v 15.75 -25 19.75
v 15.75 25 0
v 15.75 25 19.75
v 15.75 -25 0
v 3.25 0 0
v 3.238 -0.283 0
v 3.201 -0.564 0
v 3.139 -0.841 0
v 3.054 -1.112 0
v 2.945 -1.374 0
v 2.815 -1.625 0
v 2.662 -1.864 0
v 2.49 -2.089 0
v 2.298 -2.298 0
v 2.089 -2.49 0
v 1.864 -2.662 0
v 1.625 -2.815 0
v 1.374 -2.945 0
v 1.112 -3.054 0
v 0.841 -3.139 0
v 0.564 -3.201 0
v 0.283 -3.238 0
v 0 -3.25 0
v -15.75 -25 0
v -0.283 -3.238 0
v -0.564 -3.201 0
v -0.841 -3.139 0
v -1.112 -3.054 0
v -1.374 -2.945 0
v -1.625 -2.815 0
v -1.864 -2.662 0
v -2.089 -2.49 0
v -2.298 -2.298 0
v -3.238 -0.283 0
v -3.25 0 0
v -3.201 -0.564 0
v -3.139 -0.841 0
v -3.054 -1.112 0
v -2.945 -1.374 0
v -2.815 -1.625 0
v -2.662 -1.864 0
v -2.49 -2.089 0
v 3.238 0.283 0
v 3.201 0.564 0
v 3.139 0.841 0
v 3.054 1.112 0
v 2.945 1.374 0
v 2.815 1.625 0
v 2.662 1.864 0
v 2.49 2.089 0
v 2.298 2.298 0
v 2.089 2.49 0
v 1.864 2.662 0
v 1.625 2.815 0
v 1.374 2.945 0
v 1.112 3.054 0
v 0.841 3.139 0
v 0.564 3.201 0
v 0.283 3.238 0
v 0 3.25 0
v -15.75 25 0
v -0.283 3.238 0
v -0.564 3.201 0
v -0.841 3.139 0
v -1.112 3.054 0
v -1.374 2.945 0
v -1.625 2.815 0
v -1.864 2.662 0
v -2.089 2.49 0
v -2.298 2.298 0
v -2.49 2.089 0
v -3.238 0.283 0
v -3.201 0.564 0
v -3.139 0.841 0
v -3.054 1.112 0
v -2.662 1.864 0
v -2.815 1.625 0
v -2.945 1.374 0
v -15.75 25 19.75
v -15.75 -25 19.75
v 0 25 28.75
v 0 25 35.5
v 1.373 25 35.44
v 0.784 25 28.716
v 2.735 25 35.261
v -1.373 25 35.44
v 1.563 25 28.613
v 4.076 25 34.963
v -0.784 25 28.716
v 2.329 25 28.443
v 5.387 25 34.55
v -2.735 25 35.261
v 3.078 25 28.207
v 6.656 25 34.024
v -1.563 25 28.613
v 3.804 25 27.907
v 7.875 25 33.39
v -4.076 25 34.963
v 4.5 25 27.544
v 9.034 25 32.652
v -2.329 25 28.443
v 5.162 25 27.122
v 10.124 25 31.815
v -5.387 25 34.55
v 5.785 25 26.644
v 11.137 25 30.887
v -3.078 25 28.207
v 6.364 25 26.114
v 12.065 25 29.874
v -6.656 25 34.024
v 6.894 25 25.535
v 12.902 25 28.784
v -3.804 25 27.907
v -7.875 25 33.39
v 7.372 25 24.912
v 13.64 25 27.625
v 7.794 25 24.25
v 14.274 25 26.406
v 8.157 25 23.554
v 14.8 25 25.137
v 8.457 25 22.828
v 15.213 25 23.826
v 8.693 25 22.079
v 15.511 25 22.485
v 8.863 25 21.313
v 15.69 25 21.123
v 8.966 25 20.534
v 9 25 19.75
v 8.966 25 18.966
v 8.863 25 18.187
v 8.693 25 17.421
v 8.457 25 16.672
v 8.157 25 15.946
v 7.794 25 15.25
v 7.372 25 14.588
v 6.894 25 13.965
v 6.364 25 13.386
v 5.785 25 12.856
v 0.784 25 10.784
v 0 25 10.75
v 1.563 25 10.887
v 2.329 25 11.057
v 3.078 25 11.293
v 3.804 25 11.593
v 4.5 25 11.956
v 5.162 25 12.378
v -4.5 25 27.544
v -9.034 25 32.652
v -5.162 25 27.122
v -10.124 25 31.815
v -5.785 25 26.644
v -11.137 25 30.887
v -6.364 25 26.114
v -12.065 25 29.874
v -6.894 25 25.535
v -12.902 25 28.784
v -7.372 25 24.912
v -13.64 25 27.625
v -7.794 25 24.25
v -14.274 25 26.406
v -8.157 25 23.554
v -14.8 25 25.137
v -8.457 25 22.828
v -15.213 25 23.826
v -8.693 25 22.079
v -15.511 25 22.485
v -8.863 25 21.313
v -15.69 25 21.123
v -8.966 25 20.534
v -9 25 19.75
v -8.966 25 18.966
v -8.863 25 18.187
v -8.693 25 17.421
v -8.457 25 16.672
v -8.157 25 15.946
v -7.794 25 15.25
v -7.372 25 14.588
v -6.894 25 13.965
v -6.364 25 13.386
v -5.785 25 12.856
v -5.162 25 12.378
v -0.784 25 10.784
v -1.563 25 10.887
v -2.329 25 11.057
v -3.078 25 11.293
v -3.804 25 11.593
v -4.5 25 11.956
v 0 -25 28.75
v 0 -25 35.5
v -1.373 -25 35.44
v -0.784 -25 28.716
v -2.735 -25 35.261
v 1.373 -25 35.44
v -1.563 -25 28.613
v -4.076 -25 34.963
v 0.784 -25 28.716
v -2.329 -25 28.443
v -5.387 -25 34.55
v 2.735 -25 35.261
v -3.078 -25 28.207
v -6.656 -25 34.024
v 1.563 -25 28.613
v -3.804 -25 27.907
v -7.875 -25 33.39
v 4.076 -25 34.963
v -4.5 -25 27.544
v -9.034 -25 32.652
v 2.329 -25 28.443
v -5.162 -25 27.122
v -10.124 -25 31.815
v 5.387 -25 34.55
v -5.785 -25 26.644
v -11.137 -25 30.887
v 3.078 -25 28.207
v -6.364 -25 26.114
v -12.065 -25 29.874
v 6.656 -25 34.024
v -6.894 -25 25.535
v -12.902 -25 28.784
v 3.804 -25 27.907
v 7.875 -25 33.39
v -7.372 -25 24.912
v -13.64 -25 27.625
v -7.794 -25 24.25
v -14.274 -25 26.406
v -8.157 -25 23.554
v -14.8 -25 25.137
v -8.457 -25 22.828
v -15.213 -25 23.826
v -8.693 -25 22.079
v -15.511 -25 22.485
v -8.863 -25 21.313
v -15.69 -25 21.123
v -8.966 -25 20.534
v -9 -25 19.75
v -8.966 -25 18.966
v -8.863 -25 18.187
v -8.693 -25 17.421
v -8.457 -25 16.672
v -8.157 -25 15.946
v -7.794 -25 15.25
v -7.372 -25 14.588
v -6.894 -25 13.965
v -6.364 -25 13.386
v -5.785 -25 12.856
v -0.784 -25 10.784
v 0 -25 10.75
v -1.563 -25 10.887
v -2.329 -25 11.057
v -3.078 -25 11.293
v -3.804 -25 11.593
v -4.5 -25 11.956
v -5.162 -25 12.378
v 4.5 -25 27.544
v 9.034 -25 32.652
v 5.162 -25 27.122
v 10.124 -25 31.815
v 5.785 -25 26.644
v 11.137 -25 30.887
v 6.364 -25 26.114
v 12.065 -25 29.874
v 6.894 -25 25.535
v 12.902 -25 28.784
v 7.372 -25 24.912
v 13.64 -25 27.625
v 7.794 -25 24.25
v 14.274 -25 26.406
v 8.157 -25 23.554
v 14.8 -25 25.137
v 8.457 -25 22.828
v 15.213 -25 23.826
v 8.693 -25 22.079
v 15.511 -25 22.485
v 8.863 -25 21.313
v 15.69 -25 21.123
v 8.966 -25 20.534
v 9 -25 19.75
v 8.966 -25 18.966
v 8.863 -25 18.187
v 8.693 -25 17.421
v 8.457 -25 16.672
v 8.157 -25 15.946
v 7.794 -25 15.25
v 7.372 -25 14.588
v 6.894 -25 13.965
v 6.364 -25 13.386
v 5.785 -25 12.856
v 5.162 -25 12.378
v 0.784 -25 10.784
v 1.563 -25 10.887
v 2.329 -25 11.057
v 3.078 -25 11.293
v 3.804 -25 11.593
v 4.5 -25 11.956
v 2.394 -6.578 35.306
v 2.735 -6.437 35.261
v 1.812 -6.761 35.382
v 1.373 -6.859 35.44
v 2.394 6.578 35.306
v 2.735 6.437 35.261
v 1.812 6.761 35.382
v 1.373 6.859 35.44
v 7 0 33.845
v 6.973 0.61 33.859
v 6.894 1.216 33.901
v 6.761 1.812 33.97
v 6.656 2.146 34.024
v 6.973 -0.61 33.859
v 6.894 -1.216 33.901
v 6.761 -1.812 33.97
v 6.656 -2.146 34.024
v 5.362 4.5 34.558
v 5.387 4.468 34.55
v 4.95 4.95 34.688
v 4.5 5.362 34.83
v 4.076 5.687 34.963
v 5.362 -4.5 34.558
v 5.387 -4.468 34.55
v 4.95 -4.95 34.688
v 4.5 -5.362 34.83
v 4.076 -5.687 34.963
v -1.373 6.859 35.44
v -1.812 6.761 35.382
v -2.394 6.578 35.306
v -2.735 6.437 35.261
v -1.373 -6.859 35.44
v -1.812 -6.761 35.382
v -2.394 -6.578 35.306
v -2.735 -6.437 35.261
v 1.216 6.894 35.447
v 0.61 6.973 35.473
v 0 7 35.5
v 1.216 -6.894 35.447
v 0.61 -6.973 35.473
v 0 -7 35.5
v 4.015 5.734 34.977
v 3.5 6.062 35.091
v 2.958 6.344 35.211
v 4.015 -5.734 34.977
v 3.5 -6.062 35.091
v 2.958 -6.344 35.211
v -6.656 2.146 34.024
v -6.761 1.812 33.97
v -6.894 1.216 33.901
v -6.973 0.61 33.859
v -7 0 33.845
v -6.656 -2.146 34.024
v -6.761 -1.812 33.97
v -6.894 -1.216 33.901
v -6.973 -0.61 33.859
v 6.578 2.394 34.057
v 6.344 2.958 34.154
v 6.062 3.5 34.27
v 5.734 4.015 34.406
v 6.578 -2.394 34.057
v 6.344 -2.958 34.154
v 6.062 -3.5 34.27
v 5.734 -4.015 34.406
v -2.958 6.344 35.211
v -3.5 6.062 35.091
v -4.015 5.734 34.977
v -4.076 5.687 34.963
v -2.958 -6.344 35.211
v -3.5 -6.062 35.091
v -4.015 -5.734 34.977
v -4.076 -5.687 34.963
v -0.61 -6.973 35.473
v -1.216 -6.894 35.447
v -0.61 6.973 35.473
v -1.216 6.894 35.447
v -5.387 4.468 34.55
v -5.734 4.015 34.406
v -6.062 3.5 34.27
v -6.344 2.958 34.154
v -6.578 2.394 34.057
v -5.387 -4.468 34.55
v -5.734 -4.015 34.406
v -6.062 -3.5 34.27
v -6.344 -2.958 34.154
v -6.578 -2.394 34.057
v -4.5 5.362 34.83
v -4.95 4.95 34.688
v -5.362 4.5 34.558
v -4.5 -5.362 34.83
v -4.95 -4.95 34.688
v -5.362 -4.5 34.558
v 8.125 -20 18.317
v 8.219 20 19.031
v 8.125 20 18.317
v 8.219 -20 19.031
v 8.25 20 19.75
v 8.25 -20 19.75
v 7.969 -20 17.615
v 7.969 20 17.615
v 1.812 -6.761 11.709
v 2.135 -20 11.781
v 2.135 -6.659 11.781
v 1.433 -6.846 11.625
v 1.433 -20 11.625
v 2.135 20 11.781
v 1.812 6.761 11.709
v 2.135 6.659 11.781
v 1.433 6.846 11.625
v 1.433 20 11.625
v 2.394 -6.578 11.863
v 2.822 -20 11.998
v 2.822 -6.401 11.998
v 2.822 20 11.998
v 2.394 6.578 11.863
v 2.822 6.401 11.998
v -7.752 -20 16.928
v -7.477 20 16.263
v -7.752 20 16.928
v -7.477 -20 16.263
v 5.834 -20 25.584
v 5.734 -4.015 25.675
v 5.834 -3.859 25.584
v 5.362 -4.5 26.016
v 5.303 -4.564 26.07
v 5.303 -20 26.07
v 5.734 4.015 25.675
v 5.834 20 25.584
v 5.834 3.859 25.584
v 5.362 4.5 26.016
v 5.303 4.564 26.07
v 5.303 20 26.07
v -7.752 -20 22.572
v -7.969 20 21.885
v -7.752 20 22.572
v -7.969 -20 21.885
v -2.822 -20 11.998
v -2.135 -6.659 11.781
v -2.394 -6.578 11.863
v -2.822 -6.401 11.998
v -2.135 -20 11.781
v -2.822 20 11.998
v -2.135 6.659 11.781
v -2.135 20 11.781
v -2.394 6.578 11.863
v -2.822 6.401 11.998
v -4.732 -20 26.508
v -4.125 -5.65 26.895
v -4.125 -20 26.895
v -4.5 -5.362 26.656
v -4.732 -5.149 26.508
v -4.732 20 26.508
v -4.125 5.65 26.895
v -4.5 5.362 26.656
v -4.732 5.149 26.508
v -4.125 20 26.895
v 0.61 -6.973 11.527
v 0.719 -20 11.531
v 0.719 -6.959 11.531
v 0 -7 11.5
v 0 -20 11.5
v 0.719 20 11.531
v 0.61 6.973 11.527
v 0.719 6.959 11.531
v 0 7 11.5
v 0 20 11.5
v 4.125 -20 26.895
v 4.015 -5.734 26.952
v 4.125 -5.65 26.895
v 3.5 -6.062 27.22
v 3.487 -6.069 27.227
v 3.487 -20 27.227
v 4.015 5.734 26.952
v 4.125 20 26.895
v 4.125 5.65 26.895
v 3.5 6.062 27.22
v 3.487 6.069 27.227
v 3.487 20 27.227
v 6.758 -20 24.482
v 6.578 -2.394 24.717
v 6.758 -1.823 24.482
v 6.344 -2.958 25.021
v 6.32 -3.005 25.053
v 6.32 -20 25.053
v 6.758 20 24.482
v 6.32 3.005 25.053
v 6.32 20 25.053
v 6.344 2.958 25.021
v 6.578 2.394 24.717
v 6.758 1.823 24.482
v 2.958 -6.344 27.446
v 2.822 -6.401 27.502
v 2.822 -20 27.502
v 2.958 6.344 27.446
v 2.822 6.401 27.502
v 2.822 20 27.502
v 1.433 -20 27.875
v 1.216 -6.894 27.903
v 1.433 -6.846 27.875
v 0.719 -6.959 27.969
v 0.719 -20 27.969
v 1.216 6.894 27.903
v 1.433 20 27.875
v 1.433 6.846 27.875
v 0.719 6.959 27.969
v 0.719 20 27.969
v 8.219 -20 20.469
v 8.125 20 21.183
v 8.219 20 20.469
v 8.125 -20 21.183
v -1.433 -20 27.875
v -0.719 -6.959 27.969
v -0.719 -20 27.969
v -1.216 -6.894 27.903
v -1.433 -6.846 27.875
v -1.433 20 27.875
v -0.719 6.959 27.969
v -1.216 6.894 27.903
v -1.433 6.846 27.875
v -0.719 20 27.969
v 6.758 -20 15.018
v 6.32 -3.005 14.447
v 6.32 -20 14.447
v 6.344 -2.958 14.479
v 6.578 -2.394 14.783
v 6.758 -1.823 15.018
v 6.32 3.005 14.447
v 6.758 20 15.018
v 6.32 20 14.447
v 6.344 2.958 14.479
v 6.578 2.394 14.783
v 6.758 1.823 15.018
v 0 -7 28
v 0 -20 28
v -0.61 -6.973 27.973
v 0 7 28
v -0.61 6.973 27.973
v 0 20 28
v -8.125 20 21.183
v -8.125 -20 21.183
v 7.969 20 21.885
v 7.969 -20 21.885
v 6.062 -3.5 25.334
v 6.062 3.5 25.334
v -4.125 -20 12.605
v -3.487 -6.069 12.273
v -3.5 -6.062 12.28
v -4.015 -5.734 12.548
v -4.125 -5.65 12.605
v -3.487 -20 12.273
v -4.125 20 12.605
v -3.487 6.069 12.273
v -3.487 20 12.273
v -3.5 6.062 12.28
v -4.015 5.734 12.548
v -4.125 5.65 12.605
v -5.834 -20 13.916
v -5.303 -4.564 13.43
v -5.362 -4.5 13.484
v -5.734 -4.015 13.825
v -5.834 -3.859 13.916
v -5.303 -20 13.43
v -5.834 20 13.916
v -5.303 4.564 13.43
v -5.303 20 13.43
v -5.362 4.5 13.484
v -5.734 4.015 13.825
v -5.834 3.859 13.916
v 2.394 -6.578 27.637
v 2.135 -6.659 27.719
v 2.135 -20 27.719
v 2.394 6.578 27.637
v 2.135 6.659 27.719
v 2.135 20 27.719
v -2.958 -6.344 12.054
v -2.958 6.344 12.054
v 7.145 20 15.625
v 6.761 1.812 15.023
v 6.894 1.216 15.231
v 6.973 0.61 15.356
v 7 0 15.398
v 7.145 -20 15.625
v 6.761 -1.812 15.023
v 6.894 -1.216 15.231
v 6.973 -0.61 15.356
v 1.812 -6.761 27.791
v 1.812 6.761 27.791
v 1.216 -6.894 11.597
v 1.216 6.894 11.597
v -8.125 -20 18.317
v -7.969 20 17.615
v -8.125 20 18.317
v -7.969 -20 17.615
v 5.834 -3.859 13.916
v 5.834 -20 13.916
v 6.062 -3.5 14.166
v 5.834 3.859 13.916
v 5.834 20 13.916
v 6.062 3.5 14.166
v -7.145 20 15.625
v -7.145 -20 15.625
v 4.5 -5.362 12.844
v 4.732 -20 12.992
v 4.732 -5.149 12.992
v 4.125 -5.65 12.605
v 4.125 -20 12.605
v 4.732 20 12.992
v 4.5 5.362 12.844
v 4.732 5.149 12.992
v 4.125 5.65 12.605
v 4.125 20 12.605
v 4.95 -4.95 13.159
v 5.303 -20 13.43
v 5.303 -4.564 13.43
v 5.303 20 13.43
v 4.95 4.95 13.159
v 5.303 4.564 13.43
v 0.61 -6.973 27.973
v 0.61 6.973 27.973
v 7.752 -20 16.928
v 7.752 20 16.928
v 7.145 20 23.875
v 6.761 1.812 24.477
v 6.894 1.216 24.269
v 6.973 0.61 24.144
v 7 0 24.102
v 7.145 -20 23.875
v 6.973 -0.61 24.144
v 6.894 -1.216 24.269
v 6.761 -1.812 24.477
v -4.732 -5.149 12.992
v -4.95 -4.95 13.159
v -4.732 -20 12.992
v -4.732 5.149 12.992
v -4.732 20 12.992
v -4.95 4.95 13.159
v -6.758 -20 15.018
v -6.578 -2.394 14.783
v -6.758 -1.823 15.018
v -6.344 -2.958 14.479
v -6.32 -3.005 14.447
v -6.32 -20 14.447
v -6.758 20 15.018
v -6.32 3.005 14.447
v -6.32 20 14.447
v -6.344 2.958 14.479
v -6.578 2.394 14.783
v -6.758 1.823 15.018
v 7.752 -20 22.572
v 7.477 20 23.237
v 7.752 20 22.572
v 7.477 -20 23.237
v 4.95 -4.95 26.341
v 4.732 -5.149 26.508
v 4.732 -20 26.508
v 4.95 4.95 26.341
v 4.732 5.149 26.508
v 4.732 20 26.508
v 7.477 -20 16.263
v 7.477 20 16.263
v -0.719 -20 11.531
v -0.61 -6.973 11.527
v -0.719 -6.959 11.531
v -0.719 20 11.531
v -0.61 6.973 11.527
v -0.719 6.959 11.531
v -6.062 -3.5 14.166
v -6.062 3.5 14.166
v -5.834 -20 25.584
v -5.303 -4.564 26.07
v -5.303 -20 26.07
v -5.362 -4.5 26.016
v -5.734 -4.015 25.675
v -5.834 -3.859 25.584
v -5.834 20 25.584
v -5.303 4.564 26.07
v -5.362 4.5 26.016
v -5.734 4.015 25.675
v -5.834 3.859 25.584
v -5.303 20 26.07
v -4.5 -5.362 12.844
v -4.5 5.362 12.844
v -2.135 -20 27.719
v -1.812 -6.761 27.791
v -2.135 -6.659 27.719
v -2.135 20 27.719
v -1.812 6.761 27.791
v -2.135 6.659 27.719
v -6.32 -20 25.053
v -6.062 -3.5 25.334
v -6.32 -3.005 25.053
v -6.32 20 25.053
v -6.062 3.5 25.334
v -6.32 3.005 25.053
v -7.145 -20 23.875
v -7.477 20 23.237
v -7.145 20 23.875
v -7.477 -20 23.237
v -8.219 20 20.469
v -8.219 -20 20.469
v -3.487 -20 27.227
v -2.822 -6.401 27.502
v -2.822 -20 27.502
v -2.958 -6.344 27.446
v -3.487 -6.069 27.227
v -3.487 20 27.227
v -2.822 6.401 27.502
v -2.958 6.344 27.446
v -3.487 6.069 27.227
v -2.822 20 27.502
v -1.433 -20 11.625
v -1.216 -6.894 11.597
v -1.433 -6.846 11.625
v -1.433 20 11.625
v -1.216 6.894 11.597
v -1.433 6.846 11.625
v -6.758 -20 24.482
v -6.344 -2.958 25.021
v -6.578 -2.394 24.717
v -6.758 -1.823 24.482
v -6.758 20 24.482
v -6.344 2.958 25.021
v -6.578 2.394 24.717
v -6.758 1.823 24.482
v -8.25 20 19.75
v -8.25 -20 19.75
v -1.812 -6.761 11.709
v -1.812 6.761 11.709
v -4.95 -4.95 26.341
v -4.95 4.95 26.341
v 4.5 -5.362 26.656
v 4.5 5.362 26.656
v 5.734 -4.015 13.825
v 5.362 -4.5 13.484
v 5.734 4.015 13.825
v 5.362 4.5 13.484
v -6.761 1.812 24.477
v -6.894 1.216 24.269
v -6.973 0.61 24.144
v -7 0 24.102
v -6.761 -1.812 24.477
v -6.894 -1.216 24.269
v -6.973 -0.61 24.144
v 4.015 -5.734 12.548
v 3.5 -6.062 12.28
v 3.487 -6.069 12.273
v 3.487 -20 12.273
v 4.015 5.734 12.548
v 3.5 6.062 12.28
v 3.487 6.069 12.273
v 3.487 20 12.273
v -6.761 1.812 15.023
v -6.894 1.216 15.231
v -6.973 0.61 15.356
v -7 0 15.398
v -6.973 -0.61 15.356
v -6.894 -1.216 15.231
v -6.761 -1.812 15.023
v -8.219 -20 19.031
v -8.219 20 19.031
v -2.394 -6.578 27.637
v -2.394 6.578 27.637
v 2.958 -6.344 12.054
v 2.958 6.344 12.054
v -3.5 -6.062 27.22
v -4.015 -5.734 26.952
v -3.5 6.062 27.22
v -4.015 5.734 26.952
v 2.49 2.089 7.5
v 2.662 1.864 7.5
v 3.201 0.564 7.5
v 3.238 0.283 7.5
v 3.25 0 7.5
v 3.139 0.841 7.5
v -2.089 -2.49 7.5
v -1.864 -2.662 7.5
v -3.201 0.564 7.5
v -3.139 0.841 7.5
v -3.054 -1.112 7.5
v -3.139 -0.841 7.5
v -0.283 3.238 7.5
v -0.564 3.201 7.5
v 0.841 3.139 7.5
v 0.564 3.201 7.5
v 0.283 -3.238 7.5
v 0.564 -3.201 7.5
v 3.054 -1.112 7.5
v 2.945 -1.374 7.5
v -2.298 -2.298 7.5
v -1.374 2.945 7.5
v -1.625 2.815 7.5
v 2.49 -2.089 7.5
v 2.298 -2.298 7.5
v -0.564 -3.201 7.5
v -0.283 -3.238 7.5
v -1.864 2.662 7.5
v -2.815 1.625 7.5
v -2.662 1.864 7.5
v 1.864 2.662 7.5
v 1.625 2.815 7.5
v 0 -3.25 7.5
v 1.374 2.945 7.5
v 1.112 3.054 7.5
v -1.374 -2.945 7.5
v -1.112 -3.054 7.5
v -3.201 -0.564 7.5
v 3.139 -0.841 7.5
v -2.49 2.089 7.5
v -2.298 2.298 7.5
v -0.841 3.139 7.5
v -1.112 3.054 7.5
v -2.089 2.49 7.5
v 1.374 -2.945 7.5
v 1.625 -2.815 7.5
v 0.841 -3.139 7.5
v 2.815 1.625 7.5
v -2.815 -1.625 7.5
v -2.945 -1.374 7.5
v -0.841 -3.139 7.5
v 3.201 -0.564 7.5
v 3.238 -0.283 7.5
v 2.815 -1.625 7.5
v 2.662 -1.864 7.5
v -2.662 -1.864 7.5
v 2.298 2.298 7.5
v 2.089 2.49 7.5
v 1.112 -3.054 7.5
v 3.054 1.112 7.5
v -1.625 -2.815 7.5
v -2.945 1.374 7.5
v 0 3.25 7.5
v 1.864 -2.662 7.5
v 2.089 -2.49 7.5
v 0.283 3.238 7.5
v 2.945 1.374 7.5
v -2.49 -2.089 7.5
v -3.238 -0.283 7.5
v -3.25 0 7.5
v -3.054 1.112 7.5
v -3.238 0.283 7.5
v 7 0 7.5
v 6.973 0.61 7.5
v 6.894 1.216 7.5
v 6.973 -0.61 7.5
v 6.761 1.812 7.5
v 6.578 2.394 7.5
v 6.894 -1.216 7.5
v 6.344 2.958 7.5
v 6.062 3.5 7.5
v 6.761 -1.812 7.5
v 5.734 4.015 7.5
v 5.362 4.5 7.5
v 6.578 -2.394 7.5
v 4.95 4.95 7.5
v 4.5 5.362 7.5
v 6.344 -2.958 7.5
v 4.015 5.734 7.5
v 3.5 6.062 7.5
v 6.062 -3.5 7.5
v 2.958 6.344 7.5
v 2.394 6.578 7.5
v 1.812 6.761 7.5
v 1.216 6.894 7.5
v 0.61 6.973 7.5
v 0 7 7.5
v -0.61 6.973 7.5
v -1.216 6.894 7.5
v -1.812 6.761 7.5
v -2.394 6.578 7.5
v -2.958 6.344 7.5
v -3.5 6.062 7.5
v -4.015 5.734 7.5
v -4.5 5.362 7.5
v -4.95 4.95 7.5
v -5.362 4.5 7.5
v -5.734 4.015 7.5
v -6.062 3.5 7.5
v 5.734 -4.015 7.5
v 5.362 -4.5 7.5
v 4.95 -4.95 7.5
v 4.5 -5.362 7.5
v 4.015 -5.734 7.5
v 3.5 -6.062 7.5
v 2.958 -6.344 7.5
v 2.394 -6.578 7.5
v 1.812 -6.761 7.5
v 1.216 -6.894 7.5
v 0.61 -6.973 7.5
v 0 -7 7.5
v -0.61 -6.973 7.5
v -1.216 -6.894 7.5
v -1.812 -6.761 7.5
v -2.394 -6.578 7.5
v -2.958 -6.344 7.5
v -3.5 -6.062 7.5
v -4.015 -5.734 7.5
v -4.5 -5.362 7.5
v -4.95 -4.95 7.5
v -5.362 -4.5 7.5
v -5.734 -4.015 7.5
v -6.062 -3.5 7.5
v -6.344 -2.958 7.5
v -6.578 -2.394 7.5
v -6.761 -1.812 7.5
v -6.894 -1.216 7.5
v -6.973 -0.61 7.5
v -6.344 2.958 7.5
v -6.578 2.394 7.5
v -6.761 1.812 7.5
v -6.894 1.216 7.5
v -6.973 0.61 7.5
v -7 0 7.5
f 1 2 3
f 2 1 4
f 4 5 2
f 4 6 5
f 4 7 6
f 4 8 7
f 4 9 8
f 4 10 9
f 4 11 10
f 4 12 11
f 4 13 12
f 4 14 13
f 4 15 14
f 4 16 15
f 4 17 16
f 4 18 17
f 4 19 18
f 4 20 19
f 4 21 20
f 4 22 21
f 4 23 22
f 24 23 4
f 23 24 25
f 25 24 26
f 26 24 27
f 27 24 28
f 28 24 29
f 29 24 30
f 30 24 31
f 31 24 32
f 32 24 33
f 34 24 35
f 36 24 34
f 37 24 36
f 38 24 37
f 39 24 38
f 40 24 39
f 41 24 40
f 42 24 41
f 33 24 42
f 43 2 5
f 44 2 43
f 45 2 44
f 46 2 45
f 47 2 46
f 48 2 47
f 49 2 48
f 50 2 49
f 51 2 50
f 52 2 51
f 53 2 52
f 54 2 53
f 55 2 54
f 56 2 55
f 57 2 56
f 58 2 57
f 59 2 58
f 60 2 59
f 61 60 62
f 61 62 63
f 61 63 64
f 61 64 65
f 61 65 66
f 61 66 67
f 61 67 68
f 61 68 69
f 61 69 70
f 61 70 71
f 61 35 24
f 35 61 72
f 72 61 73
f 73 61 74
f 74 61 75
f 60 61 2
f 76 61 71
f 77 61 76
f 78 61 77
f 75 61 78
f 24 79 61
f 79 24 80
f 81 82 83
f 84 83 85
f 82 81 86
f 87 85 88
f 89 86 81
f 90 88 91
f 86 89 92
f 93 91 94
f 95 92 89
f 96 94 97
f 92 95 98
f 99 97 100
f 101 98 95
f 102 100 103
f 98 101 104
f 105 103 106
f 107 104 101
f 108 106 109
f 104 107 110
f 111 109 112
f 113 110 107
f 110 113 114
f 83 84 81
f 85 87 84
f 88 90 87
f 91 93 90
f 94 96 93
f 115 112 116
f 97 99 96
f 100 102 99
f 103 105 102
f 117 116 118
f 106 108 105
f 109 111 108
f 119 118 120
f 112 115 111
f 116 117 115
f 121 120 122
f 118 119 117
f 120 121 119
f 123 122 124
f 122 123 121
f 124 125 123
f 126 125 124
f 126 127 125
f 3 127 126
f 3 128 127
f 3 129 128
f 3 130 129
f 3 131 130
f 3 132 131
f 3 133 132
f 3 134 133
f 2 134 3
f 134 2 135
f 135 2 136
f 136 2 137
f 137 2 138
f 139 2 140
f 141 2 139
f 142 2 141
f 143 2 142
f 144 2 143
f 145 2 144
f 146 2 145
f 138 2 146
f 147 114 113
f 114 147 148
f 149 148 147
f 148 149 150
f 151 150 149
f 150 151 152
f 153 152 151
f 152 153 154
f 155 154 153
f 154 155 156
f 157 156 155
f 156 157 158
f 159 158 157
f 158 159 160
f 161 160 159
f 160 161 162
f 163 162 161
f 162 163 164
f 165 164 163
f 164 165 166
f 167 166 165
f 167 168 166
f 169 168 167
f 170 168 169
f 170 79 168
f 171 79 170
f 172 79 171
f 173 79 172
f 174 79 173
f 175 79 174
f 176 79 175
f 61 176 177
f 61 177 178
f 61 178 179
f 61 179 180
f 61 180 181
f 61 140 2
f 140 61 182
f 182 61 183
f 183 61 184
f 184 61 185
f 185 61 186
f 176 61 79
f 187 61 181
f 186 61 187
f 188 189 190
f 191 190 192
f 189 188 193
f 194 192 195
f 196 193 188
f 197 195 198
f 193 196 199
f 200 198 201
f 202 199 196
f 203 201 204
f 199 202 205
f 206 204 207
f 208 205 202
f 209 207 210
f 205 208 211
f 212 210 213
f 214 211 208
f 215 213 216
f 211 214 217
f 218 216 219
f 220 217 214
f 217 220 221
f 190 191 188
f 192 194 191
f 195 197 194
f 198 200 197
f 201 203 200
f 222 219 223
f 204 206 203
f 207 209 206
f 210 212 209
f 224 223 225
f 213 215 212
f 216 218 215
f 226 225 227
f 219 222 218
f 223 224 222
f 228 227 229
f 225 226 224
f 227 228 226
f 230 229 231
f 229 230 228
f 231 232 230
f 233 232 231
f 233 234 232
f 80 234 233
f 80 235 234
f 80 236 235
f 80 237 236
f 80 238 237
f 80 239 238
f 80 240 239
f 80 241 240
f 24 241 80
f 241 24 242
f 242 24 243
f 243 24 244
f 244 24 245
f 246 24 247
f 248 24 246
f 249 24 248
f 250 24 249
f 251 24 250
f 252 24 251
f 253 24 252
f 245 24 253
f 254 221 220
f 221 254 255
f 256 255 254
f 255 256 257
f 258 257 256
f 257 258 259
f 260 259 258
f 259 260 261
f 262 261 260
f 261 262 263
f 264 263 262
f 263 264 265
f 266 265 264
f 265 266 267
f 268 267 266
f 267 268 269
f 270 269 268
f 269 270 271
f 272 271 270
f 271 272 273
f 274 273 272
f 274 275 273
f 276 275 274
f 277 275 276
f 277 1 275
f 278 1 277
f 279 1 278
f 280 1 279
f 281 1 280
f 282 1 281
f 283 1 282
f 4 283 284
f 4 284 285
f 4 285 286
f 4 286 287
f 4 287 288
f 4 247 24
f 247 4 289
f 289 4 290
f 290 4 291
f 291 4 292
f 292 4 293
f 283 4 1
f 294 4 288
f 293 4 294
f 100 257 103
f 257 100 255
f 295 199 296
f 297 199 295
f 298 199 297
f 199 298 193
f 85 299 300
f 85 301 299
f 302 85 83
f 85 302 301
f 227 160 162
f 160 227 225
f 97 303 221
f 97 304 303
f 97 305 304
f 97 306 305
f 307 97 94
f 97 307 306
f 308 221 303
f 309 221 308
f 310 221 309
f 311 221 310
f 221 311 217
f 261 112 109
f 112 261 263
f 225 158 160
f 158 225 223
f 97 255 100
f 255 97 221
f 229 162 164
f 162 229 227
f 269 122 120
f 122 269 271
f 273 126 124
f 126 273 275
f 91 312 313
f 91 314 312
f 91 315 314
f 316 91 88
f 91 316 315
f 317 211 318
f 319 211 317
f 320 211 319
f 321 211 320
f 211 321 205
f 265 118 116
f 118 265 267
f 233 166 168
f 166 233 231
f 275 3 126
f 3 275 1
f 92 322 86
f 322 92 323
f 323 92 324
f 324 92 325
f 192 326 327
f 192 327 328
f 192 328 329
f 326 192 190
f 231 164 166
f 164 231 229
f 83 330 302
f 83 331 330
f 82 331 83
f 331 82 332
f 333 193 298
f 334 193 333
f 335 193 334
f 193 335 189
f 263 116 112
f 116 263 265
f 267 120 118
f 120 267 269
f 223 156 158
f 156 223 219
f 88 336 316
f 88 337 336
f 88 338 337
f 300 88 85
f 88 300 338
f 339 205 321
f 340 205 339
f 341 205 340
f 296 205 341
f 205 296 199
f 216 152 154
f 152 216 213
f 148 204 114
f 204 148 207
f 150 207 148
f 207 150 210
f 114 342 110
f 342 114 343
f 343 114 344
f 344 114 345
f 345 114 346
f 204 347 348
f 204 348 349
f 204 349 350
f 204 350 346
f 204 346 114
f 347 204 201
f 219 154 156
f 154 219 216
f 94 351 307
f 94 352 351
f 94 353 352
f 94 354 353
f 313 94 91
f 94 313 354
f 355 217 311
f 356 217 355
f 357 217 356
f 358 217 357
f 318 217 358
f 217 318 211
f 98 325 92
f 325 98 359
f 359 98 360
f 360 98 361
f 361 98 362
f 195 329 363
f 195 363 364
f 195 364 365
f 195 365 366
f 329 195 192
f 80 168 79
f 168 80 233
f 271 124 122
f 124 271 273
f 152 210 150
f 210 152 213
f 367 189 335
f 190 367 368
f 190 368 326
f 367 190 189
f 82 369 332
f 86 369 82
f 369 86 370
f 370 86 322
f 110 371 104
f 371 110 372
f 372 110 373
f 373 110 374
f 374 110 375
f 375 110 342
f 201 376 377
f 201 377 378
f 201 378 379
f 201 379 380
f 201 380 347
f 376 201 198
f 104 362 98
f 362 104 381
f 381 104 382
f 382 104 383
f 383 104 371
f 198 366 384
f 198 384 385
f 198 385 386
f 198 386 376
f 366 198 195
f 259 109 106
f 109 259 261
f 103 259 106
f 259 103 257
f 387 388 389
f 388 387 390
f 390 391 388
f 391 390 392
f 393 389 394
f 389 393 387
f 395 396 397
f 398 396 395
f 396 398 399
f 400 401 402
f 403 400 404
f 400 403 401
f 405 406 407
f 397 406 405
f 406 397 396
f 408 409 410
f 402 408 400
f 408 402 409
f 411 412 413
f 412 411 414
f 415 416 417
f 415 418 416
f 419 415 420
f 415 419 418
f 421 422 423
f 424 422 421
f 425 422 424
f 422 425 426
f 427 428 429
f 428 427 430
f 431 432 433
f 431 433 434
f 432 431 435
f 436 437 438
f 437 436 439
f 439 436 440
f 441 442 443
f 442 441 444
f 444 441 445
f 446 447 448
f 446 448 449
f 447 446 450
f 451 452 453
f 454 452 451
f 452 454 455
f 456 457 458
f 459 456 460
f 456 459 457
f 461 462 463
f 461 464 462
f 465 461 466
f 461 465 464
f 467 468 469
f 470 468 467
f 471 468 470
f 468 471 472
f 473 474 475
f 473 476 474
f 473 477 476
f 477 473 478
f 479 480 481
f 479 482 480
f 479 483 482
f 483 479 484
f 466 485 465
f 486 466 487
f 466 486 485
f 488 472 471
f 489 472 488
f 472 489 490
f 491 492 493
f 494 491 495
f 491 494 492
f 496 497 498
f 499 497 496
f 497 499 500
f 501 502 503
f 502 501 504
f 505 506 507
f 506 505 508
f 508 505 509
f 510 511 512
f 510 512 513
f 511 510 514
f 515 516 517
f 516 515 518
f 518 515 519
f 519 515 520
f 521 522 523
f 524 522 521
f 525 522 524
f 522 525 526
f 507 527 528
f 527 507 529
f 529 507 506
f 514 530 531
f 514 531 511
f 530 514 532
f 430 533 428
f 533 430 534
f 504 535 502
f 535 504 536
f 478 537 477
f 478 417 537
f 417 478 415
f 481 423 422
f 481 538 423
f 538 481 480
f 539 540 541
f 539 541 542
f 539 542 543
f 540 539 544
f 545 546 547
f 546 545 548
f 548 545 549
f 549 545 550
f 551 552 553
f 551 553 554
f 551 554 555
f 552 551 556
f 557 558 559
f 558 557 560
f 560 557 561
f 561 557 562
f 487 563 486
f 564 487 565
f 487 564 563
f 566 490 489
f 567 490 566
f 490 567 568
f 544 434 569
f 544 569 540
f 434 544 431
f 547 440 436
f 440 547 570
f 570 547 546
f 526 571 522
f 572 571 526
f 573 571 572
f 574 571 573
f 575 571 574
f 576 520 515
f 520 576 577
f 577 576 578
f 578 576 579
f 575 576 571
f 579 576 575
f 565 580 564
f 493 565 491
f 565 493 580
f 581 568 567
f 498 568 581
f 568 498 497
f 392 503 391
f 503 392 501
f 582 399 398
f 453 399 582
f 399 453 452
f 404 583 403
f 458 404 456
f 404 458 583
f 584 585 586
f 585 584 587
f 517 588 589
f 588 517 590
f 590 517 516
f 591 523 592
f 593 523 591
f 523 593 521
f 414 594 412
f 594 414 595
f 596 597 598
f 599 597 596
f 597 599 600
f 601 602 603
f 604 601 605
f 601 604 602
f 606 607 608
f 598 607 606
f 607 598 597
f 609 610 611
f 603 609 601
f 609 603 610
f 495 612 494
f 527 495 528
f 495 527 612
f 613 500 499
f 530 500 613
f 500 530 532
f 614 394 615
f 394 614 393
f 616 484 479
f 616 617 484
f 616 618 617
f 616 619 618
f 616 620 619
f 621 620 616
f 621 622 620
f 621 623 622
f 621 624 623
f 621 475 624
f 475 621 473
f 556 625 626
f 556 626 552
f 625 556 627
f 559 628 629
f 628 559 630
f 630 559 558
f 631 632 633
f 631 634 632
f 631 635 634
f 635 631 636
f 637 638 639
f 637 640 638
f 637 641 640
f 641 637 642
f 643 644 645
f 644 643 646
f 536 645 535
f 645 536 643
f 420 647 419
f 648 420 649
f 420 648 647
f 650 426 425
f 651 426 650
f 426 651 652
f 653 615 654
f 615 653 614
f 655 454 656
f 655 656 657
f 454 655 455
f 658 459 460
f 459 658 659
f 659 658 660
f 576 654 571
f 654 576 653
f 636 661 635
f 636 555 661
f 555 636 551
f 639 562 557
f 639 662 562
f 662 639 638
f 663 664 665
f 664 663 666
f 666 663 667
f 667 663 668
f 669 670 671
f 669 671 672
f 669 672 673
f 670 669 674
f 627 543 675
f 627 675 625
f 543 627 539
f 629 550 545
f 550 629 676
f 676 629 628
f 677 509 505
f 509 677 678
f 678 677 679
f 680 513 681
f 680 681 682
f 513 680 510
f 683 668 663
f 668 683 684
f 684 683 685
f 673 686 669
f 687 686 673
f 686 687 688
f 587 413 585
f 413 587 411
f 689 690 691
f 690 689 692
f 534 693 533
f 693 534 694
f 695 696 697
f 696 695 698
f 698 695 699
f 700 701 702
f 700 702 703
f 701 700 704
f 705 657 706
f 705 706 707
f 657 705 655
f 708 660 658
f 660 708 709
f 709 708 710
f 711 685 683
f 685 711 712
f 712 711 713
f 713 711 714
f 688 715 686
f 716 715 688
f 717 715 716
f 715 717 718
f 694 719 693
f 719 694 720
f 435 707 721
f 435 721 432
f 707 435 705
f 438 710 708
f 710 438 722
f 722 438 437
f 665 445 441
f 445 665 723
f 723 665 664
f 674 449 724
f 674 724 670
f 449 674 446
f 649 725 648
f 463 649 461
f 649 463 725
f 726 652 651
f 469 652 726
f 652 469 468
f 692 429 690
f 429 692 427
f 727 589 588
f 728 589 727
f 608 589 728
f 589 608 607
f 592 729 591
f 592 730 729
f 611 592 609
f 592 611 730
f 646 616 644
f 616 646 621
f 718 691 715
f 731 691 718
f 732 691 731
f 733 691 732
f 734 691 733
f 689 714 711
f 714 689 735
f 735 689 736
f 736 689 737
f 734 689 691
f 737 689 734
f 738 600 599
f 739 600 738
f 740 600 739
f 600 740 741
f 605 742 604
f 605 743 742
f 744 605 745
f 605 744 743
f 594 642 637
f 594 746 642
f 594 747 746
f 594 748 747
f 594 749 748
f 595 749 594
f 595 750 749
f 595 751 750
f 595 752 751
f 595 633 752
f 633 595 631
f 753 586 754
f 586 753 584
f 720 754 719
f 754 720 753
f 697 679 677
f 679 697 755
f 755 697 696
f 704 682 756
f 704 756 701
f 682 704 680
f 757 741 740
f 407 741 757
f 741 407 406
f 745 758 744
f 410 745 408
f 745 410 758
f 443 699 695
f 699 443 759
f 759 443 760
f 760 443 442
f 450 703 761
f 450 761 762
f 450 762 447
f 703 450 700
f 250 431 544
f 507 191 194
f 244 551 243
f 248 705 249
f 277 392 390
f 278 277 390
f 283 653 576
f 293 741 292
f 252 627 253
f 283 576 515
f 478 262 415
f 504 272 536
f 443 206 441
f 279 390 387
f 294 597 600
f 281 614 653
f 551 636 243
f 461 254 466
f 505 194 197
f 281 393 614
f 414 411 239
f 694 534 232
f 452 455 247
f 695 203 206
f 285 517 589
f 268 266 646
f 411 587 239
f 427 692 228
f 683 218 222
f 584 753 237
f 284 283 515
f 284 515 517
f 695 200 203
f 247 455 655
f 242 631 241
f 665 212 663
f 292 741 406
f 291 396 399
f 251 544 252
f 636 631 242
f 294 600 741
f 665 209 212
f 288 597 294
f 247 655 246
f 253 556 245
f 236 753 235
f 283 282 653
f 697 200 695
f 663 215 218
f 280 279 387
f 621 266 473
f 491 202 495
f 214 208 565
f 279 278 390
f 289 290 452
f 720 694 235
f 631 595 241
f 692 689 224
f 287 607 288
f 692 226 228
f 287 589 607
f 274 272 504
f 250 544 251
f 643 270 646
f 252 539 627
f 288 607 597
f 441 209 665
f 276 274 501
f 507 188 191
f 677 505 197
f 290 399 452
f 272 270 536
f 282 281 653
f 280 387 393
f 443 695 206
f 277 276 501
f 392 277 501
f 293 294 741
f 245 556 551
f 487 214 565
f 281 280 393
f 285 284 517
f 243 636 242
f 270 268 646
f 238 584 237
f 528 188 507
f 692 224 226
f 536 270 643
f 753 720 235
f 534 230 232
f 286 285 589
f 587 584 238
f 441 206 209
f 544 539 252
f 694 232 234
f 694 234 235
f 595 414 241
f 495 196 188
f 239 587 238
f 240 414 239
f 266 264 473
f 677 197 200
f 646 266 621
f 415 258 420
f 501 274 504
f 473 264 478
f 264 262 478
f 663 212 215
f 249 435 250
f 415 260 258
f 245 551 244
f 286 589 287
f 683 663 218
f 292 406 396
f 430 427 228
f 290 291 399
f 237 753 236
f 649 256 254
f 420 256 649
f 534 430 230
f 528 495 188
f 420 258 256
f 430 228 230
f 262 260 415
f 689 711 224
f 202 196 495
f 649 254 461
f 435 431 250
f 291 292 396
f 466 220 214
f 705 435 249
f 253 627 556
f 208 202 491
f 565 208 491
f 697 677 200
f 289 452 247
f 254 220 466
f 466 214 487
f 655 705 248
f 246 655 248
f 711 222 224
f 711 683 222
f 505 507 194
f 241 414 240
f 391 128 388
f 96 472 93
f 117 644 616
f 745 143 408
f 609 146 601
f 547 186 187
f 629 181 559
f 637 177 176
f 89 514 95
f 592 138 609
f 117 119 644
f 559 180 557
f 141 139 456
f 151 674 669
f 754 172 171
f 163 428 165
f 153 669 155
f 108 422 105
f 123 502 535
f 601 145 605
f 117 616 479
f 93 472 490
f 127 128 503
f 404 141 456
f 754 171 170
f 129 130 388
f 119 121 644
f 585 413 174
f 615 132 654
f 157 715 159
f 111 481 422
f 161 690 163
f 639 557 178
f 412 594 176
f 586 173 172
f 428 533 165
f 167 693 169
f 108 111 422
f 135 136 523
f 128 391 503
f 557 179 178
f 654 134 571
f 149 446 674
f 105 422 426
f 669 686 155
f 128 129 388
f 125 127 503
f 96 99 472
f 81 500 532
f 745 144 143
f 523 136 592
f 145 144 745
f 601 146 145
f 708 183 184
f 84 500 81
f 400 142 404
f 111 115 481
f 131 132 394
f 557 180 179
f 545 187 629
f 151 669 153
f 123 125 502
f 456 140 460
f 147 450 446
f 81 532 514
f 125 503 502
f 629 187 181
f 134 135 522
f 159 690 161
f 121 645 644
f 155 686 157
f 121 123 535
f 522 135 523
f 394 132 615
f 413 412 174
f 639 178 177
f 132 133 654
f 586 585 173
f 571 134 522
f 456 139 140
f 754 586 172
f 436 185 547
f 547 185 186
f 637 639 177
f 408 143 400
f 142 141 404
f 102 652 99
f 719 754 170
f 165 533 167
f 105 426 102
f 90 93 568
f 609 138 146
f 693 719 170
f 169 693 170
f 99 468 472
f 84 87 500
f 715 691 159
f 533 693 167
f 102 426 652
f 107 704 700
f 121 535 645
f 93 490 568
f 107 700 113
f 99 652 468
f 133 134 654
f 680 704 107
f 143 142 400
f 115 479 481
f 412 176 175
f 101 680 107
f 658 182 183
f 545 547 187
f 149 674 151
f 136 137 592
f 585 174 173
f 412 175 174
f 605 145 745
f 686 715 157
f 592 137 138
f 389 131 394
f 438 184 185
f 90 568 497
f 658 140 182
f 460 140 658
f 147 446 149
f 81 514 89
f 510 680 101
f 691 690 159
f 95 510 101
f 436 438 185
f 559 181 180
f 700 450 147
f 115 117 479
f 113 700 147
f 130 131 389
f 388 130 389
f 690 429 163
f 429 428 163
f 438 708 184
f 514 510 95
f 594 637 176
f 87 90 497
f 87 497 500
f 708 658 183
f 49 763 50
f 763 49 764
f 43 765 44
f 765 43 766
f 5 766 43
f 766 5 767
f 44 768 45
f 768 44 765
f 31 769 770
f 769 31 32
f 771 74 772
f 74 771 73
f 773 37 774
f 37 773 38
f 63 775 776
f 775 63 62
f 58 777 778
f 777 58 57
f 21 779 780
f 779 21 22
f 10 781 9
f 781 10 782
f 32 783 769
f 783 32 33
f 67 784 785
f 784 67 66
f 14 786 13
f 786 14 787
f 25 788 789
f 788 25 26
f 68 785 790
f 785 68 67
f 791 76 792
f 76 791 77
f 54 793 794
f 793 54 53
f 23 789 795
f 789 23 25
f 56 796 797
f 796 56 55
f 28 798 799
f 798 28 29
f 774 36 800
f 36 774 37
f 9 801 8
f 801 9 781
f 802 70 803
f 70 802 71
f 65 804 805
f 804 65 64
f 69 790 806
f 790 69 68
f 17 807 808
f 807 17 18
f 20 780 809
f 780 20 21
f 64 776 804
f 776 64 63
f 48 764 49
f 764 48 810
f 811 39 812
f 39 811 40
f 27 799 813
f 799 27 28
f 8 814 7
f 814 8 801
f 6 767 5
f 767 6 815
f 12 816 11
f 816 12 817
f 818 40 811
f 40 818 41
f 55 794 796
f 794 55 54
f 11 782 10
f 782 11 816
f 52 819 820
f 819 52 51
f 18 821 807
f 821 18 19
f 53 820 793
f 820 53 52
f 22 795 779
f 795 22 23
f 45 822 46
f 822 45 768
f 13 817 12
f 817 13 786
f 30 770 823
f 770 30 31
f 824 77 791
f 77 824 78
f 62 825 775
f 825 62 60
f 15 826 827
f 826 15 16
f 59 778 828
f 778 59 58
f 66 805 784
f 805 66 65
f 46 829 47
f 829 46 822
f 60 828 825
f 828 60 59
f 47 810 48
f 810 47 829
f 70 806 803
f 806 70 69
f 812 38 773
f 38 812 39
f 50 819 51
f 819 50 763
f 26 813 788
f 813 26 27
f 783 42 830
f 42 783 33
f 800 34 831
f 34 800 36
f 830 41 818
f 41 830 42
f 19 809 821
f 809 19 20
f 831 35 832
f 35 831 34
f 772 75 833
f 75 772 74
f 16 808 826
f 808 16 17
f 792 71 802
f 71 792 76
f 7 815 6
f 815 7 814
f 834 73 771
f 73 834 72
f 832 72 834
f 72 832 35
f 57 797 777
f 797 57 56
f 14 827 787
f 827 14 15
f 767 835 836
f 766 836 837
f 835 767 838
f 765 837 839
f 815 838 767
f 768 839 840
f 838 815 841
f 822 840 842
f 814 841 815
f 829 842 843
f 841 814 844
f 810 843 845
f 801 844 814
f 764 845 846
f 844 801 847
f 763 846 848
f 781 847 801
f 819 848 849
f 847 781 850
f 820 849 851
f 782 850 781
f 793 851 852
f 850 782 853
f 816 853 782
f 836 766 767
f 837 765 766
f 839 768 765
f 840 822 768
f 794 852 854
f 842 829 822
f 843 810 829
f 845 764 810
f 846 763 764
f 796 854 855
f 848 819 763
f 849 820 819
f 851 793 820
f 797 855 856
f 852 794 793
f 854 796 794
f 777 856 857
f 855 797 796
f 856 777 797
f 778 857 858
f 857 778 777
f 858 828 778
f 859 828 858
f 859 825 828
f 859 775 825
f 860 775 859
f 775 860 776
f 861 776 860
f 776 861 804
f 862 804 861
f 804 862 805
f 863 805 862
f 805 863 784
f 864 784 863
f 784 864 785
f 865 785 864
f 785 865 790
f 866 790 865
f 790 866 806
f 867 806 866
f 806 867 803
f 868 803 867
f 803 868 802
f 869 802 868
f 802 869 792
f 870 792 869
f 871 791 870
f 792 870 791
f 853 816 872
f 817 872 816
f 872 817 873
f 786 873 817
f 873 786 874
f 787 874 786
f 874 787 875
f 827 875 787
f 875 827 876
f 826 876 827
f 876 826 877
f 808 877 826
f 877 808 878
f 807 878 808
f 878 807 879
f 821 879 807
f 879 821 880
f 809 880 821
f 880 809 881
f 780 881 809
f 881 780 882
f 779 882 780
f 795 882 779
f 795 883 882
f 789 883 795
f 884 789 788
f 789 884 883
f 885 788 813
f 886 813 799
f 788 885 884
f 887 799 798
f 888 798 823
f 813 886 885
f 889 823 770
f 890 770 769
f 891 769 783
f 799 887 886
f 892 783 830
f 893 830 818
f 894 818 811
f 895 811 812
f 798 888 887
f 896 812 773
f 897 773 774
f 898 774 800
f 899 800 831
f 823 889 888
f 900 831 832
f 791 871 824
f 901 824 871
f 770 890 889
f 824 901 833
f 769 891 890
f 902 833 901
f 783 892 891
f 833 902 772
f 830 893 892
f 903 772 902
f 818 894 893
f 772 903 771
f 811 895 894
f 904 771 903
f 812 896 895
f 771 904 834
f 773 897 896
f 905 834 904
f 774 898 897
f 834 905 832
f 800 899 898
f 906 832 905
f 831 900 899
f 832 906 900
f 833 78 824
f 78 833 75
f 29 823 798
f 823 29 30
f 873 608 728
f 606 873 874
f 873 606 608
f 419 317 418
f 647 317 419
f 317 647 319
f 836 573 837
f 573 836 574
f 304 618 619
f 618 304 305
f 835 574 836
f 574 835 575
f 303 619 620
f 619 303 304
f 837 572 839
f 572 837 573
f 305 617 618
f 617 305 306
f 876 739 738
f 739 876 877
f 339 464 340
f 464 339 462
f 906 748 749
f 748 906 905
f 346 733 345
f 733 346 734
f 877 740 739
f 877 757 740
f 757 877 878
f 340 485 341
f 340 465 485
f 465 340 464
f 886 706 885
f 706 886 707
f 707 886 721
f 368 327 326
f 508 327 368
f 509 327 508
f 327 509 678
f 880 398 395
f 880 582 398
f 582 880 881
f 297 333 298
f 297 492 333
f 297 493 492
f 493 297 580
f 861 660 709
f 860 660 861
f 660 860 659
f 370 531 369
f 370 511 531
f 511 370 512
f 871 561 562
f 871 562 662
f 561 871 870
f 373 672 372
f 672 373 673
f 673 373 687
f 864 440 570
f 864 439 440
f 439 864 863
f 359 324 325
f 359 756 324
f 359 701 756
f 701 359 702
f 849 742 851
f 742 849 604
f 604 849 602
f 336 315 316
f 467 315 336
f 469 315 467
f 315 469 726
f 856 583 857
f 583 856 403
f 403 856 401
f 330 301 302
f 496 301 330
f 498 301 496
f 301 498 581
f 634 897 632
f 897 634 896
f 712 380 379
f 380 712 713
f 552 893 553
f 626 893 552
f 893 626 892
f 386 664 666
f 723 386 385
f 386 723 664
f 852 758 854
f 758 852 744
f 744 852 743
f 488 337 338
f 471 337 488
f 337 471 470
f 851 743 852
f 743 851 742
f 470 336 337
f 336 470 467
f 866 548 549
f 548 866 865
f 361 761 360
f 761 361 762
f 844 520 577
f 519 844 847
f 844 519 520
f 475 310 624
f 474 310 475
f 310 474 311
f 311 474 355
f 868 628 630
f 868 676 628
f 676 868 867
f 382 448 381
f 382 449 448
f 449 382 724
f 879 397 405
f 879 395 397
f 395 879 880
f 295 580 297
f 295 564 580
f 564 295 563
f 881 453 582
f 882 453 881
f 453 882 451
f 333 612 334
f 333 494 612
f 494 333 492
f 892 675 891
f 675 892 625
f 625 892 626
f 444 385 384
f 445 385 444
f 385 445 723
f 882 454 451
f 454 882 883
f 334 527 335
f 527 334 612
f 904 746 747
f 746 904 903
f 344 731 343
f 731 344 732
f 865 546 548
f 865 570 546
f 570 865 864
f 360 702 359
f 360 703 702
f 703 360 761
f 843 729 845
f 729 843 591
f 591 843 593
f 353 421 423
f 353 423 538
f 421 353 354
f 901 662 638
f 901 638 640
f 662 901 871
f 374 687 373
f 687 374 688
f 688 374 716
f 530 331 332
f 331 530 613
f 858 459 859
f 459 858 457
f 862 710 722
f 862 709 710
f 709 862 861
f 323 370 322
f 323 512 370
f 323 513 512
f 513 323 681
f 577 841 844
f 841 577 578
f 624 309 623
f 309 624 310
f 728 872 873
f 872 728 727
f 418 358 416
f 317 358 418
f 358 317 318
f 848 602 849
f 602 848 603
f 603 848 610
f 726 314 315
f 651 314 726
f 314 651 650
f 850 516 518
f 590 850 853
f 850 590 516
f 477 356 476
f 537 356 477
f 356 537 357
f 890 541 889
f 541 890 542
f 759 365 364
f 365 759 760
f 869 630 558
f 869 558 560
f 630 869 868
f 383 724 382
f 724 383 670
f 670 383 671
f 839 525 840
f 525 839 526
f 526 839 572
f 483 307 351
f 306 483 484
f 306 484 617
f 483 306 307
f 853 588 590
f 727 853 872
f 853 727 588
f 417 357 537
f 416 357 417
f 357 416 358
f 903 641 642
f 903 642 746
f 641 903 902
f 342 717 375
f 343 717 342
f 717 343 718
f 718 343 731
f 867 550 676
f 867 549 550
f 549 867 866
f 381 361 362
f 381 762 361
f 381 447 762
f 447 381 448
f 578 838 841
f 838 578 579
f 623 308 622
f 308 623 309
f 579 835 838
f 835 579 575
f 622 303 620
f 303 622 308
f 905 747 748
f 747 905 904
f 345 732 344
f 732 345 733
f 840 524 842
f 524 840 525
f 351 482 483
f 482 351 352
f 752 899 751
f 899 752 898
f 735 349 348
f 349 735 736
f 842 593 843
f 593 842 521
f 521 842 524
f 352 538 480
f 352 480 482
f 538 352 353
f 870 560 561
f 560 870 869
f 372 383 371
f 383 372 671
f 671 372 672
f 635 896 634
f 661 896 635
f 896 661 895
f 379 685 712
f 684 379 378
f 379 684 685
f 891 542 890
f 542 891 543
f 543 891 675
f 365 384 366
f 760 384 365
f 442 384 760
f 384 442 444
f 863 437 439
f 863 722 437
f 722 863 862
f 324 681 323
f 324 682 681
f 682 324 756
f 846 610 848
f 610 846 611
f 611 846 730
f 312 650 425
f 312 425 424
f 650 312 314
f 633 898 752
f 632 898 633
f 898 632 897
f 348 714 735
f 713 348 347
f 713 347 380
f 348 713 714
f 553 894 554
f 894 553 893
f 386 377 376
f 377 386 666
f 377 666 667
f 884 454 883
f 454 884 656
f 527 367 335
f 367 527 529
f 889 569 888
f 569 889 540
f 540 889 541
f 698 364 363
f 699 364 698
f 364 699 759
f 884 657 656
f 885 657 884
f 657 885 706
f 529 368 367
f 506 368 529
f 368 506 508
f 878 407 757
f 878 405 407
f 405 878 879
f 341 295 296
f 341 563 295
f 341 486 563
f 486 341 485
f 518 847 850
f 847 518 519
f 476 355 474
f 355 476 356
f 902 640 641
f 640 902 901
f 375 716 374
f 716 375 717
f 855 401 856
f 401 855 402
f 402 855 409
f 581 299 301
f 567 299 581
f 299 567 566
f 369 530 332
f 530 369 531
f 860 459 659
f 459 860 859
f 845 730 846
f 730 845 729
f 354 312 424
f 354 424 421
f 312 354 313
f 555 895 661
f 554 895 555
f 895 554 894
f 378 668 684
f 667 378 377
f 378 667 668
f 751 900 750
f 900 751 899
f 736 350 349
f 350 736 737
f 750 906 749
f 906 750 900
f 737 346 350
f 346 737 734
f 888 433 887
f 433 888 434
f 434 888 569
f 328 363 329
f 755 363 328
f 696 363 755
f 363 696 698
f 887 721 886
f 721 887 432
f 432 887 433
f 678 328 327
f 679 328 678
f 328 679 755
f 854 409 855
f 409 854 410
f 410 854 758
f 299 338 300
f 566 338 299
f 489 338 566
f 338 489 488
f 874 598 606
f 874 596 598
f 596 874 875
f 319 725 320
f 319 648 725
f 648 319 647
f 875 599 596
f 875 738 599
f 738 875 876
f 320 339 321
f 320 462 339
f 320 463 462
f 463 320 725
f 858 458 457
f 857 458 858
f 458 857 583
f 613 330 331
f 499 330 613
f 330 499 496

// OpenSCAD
// file: measurements.scad
// The thickness of any walls (e.g. the difference between the inner and outer radiuses of a tube retainer).
thickness_mm = 7.5;

// The tube which spaces apart the VESA mount and the Kinect mount.
////////////////////////////////////////////////////////////////////////////////

// The diameter of the narrowest part of the tube's retainer.
tube_retainer_diameter_mm = 16.5;

// The total length of the tube's retainer.
tube_retainer_length_mm = 50;

// The diameter of the widest part of the tube's retainer.
tube_feed_diameter_mm = 18;

// The length of the transition between the widest and narrowest parts of the
// tube's retainer.
tube_feed_length_mm = 5;

// The number of sides on the tube's retainer.
tube_sides = 72;

// Additional radius added where a tube mounting meets a surface.
tube_widening_mm = 10;

// Kinect for Xbox 360.
////////////////////////////////////////////////////////////////////////////////

// The length of the Kinect's base.
kinect_length_mm = 75;

// The width of the bottom of the Kinect's base.
kinect_lower_width_mm = 81;

// The thickness of the base below the Kinect.
kinect_base_height_mm = 2;

// The width of the middle of the Kinect's base (its widest point).
kinect_middle_width_mm = 88.5;

// The distance between the bottom of the Kinect's base and its widest point.
kinect_lower_height_mm = 13;

// The width of the top of the Kinect's base.
kinect_top_width_mm = 80;

// The distance between the widest point of the Kinect's base and the top of the
// retainer.
kinect_upper_height_mm = 5;

// The thickness of the Kinect's retainer.
kinect_clip_thickness_mm = 2;

// The diameter of the head of the M3 screw used to secure the Kinect.
kinect_screw_head_diameter_mm = 7;

// The diameter of the hole required by the M3 screw used to secure the Kinect.
kinect_screw_hole_diameter_mm = 2.95;

// The number of sides of the head of or the hole required by the M3 screw used
// to secure the Kinect.
kinect_screw_sides = 24;

// The height of the internal bridges used to support screw holes.
kinect_screw_hole_bridge_height_mm = 0.75;

// The distance between the Kinect's front and back screw holes.
kinect_screw_y_spacing_mm = 19.25;

// The distance between the Kinect's left and right screw holes.
kinect_screw_x_spacing_mm = 68.5;

// The space which must be clear behind a Kinect for cable routing.
kinect_cable_spacing_mm = 15;

// The VESA mounting.
////////////////////////////////////////////////////////////////////////////////

// The diameter of the VESA mounting M6 screw's head.
vesa_screw_head_diameter_mm = 14;

// The diameter of the VESA mounting M6 screw's hole.
vesa_screw_hole_diameter_mm = 6.5;

// The number of sides of the VESA mounting M6 screw.
vesa_screw_sides = 72;

// The height of the VESA mounting M6 screw's head.
vesa_screw_height_height_mm = 4;

// The MALM push-fit bracket.
////////////////////////////////////////////////////////////////////////////////

// The thickness of the desk.
malm_height_mm = 50.5;

// The length of the fingers which push onto the desk.  Increase to improve
// pitch stability.
malm_length_mm = 70;

// The width of the fingers which push onto the desk.  Increase to improve roll
// stability.
malm_width_mm = 60;
// main file
include <measurements.scad>;

width_mm = max(vesa_screw_head_diameter_mm, tube_retainer_diameter_mm) + thickness_mm * 2;

difference() {
  union() {
    translate([
      width_mm / -2,
      tube_retainer_length_mm / -2,
      0,
    ]) {
      cube([
        width_mm,
        tube_retainer_length_mm,
        thickness_mm + vesa_screw_height_height_mm + tube_retainer_diameter_mm / 2,
      ]);
    };

    translate([
      0,
      tube_retainer_length_mm / -2,
      thickness_mm + vesa_screw_height_height_mm + tube_retainer_diameter_mm / 2,
    ]) {
      rotate([-90, 0, 0]) {
        cylinder(
          d = tube_retainer_diameter_mm + thickness_mm * 2,
          h = tube_retainer_length_mm,
          $fn = tube_sides
        );
      };
    };
  };

  translate([
    0,
    tube_retainer_length_mm / -2,
    thickness_mm + vesa_screw_height_height_mm + tube_retainer_diameter_mm / 2,
  ]) {
    rotate([-90, 0, 0]) {
      cylinder(
        d = tube_retainer_diameter_mm,
        h = tube_retainer_length_mm,
        $fn = tube_sides
      );
    };
  };

  translate([
    0,
    tube_retainer_length_mm / -2,
    thickness_mm + vesa_screw_height_height_mm + tube_retainer_diameter_mm / 2,
  ]) {
    rotate([-90, 0, 0]) {
      cylinder(
        d1 = tube_feed_diameter_mm,
        d2 = tube_retainer_diameter_mm,
        h = tube_feed_length_mm,
        $fn = tube_sides
      );
    };
  };

  translate([
    0,
    tube_retainer_length_mm / 2 - tube_feed_length_mm,
    thickness_mm + vesa_screw_height_height_mm + tube_retainer_diameter_mm / 2,
  ]) {
    rotate([-90, 0, 0]) {
      cylinder(
        d1 = tube_retainer_diameter_mm,
        d2 = tube_feed_diameter_mm,
        h = tube_feed_length_mm,
        $fn = tube_sides
      );
    };
  };

  cylinder(
    d = vesa_screw_hole_diameter_mm,
    h = thickness_mm,
    $fn = vesa_screw_sides
  );

  translate([0, 0, thickness_mm]) {
    cylinder(
      d = vesa_screw_head_diameter_mm,
      h = vesa_screw_height_height_mm + tube_retainer_diameter_mm + thickness_mm,
      $fn = vesa_screw_sides
    );
  };
};
